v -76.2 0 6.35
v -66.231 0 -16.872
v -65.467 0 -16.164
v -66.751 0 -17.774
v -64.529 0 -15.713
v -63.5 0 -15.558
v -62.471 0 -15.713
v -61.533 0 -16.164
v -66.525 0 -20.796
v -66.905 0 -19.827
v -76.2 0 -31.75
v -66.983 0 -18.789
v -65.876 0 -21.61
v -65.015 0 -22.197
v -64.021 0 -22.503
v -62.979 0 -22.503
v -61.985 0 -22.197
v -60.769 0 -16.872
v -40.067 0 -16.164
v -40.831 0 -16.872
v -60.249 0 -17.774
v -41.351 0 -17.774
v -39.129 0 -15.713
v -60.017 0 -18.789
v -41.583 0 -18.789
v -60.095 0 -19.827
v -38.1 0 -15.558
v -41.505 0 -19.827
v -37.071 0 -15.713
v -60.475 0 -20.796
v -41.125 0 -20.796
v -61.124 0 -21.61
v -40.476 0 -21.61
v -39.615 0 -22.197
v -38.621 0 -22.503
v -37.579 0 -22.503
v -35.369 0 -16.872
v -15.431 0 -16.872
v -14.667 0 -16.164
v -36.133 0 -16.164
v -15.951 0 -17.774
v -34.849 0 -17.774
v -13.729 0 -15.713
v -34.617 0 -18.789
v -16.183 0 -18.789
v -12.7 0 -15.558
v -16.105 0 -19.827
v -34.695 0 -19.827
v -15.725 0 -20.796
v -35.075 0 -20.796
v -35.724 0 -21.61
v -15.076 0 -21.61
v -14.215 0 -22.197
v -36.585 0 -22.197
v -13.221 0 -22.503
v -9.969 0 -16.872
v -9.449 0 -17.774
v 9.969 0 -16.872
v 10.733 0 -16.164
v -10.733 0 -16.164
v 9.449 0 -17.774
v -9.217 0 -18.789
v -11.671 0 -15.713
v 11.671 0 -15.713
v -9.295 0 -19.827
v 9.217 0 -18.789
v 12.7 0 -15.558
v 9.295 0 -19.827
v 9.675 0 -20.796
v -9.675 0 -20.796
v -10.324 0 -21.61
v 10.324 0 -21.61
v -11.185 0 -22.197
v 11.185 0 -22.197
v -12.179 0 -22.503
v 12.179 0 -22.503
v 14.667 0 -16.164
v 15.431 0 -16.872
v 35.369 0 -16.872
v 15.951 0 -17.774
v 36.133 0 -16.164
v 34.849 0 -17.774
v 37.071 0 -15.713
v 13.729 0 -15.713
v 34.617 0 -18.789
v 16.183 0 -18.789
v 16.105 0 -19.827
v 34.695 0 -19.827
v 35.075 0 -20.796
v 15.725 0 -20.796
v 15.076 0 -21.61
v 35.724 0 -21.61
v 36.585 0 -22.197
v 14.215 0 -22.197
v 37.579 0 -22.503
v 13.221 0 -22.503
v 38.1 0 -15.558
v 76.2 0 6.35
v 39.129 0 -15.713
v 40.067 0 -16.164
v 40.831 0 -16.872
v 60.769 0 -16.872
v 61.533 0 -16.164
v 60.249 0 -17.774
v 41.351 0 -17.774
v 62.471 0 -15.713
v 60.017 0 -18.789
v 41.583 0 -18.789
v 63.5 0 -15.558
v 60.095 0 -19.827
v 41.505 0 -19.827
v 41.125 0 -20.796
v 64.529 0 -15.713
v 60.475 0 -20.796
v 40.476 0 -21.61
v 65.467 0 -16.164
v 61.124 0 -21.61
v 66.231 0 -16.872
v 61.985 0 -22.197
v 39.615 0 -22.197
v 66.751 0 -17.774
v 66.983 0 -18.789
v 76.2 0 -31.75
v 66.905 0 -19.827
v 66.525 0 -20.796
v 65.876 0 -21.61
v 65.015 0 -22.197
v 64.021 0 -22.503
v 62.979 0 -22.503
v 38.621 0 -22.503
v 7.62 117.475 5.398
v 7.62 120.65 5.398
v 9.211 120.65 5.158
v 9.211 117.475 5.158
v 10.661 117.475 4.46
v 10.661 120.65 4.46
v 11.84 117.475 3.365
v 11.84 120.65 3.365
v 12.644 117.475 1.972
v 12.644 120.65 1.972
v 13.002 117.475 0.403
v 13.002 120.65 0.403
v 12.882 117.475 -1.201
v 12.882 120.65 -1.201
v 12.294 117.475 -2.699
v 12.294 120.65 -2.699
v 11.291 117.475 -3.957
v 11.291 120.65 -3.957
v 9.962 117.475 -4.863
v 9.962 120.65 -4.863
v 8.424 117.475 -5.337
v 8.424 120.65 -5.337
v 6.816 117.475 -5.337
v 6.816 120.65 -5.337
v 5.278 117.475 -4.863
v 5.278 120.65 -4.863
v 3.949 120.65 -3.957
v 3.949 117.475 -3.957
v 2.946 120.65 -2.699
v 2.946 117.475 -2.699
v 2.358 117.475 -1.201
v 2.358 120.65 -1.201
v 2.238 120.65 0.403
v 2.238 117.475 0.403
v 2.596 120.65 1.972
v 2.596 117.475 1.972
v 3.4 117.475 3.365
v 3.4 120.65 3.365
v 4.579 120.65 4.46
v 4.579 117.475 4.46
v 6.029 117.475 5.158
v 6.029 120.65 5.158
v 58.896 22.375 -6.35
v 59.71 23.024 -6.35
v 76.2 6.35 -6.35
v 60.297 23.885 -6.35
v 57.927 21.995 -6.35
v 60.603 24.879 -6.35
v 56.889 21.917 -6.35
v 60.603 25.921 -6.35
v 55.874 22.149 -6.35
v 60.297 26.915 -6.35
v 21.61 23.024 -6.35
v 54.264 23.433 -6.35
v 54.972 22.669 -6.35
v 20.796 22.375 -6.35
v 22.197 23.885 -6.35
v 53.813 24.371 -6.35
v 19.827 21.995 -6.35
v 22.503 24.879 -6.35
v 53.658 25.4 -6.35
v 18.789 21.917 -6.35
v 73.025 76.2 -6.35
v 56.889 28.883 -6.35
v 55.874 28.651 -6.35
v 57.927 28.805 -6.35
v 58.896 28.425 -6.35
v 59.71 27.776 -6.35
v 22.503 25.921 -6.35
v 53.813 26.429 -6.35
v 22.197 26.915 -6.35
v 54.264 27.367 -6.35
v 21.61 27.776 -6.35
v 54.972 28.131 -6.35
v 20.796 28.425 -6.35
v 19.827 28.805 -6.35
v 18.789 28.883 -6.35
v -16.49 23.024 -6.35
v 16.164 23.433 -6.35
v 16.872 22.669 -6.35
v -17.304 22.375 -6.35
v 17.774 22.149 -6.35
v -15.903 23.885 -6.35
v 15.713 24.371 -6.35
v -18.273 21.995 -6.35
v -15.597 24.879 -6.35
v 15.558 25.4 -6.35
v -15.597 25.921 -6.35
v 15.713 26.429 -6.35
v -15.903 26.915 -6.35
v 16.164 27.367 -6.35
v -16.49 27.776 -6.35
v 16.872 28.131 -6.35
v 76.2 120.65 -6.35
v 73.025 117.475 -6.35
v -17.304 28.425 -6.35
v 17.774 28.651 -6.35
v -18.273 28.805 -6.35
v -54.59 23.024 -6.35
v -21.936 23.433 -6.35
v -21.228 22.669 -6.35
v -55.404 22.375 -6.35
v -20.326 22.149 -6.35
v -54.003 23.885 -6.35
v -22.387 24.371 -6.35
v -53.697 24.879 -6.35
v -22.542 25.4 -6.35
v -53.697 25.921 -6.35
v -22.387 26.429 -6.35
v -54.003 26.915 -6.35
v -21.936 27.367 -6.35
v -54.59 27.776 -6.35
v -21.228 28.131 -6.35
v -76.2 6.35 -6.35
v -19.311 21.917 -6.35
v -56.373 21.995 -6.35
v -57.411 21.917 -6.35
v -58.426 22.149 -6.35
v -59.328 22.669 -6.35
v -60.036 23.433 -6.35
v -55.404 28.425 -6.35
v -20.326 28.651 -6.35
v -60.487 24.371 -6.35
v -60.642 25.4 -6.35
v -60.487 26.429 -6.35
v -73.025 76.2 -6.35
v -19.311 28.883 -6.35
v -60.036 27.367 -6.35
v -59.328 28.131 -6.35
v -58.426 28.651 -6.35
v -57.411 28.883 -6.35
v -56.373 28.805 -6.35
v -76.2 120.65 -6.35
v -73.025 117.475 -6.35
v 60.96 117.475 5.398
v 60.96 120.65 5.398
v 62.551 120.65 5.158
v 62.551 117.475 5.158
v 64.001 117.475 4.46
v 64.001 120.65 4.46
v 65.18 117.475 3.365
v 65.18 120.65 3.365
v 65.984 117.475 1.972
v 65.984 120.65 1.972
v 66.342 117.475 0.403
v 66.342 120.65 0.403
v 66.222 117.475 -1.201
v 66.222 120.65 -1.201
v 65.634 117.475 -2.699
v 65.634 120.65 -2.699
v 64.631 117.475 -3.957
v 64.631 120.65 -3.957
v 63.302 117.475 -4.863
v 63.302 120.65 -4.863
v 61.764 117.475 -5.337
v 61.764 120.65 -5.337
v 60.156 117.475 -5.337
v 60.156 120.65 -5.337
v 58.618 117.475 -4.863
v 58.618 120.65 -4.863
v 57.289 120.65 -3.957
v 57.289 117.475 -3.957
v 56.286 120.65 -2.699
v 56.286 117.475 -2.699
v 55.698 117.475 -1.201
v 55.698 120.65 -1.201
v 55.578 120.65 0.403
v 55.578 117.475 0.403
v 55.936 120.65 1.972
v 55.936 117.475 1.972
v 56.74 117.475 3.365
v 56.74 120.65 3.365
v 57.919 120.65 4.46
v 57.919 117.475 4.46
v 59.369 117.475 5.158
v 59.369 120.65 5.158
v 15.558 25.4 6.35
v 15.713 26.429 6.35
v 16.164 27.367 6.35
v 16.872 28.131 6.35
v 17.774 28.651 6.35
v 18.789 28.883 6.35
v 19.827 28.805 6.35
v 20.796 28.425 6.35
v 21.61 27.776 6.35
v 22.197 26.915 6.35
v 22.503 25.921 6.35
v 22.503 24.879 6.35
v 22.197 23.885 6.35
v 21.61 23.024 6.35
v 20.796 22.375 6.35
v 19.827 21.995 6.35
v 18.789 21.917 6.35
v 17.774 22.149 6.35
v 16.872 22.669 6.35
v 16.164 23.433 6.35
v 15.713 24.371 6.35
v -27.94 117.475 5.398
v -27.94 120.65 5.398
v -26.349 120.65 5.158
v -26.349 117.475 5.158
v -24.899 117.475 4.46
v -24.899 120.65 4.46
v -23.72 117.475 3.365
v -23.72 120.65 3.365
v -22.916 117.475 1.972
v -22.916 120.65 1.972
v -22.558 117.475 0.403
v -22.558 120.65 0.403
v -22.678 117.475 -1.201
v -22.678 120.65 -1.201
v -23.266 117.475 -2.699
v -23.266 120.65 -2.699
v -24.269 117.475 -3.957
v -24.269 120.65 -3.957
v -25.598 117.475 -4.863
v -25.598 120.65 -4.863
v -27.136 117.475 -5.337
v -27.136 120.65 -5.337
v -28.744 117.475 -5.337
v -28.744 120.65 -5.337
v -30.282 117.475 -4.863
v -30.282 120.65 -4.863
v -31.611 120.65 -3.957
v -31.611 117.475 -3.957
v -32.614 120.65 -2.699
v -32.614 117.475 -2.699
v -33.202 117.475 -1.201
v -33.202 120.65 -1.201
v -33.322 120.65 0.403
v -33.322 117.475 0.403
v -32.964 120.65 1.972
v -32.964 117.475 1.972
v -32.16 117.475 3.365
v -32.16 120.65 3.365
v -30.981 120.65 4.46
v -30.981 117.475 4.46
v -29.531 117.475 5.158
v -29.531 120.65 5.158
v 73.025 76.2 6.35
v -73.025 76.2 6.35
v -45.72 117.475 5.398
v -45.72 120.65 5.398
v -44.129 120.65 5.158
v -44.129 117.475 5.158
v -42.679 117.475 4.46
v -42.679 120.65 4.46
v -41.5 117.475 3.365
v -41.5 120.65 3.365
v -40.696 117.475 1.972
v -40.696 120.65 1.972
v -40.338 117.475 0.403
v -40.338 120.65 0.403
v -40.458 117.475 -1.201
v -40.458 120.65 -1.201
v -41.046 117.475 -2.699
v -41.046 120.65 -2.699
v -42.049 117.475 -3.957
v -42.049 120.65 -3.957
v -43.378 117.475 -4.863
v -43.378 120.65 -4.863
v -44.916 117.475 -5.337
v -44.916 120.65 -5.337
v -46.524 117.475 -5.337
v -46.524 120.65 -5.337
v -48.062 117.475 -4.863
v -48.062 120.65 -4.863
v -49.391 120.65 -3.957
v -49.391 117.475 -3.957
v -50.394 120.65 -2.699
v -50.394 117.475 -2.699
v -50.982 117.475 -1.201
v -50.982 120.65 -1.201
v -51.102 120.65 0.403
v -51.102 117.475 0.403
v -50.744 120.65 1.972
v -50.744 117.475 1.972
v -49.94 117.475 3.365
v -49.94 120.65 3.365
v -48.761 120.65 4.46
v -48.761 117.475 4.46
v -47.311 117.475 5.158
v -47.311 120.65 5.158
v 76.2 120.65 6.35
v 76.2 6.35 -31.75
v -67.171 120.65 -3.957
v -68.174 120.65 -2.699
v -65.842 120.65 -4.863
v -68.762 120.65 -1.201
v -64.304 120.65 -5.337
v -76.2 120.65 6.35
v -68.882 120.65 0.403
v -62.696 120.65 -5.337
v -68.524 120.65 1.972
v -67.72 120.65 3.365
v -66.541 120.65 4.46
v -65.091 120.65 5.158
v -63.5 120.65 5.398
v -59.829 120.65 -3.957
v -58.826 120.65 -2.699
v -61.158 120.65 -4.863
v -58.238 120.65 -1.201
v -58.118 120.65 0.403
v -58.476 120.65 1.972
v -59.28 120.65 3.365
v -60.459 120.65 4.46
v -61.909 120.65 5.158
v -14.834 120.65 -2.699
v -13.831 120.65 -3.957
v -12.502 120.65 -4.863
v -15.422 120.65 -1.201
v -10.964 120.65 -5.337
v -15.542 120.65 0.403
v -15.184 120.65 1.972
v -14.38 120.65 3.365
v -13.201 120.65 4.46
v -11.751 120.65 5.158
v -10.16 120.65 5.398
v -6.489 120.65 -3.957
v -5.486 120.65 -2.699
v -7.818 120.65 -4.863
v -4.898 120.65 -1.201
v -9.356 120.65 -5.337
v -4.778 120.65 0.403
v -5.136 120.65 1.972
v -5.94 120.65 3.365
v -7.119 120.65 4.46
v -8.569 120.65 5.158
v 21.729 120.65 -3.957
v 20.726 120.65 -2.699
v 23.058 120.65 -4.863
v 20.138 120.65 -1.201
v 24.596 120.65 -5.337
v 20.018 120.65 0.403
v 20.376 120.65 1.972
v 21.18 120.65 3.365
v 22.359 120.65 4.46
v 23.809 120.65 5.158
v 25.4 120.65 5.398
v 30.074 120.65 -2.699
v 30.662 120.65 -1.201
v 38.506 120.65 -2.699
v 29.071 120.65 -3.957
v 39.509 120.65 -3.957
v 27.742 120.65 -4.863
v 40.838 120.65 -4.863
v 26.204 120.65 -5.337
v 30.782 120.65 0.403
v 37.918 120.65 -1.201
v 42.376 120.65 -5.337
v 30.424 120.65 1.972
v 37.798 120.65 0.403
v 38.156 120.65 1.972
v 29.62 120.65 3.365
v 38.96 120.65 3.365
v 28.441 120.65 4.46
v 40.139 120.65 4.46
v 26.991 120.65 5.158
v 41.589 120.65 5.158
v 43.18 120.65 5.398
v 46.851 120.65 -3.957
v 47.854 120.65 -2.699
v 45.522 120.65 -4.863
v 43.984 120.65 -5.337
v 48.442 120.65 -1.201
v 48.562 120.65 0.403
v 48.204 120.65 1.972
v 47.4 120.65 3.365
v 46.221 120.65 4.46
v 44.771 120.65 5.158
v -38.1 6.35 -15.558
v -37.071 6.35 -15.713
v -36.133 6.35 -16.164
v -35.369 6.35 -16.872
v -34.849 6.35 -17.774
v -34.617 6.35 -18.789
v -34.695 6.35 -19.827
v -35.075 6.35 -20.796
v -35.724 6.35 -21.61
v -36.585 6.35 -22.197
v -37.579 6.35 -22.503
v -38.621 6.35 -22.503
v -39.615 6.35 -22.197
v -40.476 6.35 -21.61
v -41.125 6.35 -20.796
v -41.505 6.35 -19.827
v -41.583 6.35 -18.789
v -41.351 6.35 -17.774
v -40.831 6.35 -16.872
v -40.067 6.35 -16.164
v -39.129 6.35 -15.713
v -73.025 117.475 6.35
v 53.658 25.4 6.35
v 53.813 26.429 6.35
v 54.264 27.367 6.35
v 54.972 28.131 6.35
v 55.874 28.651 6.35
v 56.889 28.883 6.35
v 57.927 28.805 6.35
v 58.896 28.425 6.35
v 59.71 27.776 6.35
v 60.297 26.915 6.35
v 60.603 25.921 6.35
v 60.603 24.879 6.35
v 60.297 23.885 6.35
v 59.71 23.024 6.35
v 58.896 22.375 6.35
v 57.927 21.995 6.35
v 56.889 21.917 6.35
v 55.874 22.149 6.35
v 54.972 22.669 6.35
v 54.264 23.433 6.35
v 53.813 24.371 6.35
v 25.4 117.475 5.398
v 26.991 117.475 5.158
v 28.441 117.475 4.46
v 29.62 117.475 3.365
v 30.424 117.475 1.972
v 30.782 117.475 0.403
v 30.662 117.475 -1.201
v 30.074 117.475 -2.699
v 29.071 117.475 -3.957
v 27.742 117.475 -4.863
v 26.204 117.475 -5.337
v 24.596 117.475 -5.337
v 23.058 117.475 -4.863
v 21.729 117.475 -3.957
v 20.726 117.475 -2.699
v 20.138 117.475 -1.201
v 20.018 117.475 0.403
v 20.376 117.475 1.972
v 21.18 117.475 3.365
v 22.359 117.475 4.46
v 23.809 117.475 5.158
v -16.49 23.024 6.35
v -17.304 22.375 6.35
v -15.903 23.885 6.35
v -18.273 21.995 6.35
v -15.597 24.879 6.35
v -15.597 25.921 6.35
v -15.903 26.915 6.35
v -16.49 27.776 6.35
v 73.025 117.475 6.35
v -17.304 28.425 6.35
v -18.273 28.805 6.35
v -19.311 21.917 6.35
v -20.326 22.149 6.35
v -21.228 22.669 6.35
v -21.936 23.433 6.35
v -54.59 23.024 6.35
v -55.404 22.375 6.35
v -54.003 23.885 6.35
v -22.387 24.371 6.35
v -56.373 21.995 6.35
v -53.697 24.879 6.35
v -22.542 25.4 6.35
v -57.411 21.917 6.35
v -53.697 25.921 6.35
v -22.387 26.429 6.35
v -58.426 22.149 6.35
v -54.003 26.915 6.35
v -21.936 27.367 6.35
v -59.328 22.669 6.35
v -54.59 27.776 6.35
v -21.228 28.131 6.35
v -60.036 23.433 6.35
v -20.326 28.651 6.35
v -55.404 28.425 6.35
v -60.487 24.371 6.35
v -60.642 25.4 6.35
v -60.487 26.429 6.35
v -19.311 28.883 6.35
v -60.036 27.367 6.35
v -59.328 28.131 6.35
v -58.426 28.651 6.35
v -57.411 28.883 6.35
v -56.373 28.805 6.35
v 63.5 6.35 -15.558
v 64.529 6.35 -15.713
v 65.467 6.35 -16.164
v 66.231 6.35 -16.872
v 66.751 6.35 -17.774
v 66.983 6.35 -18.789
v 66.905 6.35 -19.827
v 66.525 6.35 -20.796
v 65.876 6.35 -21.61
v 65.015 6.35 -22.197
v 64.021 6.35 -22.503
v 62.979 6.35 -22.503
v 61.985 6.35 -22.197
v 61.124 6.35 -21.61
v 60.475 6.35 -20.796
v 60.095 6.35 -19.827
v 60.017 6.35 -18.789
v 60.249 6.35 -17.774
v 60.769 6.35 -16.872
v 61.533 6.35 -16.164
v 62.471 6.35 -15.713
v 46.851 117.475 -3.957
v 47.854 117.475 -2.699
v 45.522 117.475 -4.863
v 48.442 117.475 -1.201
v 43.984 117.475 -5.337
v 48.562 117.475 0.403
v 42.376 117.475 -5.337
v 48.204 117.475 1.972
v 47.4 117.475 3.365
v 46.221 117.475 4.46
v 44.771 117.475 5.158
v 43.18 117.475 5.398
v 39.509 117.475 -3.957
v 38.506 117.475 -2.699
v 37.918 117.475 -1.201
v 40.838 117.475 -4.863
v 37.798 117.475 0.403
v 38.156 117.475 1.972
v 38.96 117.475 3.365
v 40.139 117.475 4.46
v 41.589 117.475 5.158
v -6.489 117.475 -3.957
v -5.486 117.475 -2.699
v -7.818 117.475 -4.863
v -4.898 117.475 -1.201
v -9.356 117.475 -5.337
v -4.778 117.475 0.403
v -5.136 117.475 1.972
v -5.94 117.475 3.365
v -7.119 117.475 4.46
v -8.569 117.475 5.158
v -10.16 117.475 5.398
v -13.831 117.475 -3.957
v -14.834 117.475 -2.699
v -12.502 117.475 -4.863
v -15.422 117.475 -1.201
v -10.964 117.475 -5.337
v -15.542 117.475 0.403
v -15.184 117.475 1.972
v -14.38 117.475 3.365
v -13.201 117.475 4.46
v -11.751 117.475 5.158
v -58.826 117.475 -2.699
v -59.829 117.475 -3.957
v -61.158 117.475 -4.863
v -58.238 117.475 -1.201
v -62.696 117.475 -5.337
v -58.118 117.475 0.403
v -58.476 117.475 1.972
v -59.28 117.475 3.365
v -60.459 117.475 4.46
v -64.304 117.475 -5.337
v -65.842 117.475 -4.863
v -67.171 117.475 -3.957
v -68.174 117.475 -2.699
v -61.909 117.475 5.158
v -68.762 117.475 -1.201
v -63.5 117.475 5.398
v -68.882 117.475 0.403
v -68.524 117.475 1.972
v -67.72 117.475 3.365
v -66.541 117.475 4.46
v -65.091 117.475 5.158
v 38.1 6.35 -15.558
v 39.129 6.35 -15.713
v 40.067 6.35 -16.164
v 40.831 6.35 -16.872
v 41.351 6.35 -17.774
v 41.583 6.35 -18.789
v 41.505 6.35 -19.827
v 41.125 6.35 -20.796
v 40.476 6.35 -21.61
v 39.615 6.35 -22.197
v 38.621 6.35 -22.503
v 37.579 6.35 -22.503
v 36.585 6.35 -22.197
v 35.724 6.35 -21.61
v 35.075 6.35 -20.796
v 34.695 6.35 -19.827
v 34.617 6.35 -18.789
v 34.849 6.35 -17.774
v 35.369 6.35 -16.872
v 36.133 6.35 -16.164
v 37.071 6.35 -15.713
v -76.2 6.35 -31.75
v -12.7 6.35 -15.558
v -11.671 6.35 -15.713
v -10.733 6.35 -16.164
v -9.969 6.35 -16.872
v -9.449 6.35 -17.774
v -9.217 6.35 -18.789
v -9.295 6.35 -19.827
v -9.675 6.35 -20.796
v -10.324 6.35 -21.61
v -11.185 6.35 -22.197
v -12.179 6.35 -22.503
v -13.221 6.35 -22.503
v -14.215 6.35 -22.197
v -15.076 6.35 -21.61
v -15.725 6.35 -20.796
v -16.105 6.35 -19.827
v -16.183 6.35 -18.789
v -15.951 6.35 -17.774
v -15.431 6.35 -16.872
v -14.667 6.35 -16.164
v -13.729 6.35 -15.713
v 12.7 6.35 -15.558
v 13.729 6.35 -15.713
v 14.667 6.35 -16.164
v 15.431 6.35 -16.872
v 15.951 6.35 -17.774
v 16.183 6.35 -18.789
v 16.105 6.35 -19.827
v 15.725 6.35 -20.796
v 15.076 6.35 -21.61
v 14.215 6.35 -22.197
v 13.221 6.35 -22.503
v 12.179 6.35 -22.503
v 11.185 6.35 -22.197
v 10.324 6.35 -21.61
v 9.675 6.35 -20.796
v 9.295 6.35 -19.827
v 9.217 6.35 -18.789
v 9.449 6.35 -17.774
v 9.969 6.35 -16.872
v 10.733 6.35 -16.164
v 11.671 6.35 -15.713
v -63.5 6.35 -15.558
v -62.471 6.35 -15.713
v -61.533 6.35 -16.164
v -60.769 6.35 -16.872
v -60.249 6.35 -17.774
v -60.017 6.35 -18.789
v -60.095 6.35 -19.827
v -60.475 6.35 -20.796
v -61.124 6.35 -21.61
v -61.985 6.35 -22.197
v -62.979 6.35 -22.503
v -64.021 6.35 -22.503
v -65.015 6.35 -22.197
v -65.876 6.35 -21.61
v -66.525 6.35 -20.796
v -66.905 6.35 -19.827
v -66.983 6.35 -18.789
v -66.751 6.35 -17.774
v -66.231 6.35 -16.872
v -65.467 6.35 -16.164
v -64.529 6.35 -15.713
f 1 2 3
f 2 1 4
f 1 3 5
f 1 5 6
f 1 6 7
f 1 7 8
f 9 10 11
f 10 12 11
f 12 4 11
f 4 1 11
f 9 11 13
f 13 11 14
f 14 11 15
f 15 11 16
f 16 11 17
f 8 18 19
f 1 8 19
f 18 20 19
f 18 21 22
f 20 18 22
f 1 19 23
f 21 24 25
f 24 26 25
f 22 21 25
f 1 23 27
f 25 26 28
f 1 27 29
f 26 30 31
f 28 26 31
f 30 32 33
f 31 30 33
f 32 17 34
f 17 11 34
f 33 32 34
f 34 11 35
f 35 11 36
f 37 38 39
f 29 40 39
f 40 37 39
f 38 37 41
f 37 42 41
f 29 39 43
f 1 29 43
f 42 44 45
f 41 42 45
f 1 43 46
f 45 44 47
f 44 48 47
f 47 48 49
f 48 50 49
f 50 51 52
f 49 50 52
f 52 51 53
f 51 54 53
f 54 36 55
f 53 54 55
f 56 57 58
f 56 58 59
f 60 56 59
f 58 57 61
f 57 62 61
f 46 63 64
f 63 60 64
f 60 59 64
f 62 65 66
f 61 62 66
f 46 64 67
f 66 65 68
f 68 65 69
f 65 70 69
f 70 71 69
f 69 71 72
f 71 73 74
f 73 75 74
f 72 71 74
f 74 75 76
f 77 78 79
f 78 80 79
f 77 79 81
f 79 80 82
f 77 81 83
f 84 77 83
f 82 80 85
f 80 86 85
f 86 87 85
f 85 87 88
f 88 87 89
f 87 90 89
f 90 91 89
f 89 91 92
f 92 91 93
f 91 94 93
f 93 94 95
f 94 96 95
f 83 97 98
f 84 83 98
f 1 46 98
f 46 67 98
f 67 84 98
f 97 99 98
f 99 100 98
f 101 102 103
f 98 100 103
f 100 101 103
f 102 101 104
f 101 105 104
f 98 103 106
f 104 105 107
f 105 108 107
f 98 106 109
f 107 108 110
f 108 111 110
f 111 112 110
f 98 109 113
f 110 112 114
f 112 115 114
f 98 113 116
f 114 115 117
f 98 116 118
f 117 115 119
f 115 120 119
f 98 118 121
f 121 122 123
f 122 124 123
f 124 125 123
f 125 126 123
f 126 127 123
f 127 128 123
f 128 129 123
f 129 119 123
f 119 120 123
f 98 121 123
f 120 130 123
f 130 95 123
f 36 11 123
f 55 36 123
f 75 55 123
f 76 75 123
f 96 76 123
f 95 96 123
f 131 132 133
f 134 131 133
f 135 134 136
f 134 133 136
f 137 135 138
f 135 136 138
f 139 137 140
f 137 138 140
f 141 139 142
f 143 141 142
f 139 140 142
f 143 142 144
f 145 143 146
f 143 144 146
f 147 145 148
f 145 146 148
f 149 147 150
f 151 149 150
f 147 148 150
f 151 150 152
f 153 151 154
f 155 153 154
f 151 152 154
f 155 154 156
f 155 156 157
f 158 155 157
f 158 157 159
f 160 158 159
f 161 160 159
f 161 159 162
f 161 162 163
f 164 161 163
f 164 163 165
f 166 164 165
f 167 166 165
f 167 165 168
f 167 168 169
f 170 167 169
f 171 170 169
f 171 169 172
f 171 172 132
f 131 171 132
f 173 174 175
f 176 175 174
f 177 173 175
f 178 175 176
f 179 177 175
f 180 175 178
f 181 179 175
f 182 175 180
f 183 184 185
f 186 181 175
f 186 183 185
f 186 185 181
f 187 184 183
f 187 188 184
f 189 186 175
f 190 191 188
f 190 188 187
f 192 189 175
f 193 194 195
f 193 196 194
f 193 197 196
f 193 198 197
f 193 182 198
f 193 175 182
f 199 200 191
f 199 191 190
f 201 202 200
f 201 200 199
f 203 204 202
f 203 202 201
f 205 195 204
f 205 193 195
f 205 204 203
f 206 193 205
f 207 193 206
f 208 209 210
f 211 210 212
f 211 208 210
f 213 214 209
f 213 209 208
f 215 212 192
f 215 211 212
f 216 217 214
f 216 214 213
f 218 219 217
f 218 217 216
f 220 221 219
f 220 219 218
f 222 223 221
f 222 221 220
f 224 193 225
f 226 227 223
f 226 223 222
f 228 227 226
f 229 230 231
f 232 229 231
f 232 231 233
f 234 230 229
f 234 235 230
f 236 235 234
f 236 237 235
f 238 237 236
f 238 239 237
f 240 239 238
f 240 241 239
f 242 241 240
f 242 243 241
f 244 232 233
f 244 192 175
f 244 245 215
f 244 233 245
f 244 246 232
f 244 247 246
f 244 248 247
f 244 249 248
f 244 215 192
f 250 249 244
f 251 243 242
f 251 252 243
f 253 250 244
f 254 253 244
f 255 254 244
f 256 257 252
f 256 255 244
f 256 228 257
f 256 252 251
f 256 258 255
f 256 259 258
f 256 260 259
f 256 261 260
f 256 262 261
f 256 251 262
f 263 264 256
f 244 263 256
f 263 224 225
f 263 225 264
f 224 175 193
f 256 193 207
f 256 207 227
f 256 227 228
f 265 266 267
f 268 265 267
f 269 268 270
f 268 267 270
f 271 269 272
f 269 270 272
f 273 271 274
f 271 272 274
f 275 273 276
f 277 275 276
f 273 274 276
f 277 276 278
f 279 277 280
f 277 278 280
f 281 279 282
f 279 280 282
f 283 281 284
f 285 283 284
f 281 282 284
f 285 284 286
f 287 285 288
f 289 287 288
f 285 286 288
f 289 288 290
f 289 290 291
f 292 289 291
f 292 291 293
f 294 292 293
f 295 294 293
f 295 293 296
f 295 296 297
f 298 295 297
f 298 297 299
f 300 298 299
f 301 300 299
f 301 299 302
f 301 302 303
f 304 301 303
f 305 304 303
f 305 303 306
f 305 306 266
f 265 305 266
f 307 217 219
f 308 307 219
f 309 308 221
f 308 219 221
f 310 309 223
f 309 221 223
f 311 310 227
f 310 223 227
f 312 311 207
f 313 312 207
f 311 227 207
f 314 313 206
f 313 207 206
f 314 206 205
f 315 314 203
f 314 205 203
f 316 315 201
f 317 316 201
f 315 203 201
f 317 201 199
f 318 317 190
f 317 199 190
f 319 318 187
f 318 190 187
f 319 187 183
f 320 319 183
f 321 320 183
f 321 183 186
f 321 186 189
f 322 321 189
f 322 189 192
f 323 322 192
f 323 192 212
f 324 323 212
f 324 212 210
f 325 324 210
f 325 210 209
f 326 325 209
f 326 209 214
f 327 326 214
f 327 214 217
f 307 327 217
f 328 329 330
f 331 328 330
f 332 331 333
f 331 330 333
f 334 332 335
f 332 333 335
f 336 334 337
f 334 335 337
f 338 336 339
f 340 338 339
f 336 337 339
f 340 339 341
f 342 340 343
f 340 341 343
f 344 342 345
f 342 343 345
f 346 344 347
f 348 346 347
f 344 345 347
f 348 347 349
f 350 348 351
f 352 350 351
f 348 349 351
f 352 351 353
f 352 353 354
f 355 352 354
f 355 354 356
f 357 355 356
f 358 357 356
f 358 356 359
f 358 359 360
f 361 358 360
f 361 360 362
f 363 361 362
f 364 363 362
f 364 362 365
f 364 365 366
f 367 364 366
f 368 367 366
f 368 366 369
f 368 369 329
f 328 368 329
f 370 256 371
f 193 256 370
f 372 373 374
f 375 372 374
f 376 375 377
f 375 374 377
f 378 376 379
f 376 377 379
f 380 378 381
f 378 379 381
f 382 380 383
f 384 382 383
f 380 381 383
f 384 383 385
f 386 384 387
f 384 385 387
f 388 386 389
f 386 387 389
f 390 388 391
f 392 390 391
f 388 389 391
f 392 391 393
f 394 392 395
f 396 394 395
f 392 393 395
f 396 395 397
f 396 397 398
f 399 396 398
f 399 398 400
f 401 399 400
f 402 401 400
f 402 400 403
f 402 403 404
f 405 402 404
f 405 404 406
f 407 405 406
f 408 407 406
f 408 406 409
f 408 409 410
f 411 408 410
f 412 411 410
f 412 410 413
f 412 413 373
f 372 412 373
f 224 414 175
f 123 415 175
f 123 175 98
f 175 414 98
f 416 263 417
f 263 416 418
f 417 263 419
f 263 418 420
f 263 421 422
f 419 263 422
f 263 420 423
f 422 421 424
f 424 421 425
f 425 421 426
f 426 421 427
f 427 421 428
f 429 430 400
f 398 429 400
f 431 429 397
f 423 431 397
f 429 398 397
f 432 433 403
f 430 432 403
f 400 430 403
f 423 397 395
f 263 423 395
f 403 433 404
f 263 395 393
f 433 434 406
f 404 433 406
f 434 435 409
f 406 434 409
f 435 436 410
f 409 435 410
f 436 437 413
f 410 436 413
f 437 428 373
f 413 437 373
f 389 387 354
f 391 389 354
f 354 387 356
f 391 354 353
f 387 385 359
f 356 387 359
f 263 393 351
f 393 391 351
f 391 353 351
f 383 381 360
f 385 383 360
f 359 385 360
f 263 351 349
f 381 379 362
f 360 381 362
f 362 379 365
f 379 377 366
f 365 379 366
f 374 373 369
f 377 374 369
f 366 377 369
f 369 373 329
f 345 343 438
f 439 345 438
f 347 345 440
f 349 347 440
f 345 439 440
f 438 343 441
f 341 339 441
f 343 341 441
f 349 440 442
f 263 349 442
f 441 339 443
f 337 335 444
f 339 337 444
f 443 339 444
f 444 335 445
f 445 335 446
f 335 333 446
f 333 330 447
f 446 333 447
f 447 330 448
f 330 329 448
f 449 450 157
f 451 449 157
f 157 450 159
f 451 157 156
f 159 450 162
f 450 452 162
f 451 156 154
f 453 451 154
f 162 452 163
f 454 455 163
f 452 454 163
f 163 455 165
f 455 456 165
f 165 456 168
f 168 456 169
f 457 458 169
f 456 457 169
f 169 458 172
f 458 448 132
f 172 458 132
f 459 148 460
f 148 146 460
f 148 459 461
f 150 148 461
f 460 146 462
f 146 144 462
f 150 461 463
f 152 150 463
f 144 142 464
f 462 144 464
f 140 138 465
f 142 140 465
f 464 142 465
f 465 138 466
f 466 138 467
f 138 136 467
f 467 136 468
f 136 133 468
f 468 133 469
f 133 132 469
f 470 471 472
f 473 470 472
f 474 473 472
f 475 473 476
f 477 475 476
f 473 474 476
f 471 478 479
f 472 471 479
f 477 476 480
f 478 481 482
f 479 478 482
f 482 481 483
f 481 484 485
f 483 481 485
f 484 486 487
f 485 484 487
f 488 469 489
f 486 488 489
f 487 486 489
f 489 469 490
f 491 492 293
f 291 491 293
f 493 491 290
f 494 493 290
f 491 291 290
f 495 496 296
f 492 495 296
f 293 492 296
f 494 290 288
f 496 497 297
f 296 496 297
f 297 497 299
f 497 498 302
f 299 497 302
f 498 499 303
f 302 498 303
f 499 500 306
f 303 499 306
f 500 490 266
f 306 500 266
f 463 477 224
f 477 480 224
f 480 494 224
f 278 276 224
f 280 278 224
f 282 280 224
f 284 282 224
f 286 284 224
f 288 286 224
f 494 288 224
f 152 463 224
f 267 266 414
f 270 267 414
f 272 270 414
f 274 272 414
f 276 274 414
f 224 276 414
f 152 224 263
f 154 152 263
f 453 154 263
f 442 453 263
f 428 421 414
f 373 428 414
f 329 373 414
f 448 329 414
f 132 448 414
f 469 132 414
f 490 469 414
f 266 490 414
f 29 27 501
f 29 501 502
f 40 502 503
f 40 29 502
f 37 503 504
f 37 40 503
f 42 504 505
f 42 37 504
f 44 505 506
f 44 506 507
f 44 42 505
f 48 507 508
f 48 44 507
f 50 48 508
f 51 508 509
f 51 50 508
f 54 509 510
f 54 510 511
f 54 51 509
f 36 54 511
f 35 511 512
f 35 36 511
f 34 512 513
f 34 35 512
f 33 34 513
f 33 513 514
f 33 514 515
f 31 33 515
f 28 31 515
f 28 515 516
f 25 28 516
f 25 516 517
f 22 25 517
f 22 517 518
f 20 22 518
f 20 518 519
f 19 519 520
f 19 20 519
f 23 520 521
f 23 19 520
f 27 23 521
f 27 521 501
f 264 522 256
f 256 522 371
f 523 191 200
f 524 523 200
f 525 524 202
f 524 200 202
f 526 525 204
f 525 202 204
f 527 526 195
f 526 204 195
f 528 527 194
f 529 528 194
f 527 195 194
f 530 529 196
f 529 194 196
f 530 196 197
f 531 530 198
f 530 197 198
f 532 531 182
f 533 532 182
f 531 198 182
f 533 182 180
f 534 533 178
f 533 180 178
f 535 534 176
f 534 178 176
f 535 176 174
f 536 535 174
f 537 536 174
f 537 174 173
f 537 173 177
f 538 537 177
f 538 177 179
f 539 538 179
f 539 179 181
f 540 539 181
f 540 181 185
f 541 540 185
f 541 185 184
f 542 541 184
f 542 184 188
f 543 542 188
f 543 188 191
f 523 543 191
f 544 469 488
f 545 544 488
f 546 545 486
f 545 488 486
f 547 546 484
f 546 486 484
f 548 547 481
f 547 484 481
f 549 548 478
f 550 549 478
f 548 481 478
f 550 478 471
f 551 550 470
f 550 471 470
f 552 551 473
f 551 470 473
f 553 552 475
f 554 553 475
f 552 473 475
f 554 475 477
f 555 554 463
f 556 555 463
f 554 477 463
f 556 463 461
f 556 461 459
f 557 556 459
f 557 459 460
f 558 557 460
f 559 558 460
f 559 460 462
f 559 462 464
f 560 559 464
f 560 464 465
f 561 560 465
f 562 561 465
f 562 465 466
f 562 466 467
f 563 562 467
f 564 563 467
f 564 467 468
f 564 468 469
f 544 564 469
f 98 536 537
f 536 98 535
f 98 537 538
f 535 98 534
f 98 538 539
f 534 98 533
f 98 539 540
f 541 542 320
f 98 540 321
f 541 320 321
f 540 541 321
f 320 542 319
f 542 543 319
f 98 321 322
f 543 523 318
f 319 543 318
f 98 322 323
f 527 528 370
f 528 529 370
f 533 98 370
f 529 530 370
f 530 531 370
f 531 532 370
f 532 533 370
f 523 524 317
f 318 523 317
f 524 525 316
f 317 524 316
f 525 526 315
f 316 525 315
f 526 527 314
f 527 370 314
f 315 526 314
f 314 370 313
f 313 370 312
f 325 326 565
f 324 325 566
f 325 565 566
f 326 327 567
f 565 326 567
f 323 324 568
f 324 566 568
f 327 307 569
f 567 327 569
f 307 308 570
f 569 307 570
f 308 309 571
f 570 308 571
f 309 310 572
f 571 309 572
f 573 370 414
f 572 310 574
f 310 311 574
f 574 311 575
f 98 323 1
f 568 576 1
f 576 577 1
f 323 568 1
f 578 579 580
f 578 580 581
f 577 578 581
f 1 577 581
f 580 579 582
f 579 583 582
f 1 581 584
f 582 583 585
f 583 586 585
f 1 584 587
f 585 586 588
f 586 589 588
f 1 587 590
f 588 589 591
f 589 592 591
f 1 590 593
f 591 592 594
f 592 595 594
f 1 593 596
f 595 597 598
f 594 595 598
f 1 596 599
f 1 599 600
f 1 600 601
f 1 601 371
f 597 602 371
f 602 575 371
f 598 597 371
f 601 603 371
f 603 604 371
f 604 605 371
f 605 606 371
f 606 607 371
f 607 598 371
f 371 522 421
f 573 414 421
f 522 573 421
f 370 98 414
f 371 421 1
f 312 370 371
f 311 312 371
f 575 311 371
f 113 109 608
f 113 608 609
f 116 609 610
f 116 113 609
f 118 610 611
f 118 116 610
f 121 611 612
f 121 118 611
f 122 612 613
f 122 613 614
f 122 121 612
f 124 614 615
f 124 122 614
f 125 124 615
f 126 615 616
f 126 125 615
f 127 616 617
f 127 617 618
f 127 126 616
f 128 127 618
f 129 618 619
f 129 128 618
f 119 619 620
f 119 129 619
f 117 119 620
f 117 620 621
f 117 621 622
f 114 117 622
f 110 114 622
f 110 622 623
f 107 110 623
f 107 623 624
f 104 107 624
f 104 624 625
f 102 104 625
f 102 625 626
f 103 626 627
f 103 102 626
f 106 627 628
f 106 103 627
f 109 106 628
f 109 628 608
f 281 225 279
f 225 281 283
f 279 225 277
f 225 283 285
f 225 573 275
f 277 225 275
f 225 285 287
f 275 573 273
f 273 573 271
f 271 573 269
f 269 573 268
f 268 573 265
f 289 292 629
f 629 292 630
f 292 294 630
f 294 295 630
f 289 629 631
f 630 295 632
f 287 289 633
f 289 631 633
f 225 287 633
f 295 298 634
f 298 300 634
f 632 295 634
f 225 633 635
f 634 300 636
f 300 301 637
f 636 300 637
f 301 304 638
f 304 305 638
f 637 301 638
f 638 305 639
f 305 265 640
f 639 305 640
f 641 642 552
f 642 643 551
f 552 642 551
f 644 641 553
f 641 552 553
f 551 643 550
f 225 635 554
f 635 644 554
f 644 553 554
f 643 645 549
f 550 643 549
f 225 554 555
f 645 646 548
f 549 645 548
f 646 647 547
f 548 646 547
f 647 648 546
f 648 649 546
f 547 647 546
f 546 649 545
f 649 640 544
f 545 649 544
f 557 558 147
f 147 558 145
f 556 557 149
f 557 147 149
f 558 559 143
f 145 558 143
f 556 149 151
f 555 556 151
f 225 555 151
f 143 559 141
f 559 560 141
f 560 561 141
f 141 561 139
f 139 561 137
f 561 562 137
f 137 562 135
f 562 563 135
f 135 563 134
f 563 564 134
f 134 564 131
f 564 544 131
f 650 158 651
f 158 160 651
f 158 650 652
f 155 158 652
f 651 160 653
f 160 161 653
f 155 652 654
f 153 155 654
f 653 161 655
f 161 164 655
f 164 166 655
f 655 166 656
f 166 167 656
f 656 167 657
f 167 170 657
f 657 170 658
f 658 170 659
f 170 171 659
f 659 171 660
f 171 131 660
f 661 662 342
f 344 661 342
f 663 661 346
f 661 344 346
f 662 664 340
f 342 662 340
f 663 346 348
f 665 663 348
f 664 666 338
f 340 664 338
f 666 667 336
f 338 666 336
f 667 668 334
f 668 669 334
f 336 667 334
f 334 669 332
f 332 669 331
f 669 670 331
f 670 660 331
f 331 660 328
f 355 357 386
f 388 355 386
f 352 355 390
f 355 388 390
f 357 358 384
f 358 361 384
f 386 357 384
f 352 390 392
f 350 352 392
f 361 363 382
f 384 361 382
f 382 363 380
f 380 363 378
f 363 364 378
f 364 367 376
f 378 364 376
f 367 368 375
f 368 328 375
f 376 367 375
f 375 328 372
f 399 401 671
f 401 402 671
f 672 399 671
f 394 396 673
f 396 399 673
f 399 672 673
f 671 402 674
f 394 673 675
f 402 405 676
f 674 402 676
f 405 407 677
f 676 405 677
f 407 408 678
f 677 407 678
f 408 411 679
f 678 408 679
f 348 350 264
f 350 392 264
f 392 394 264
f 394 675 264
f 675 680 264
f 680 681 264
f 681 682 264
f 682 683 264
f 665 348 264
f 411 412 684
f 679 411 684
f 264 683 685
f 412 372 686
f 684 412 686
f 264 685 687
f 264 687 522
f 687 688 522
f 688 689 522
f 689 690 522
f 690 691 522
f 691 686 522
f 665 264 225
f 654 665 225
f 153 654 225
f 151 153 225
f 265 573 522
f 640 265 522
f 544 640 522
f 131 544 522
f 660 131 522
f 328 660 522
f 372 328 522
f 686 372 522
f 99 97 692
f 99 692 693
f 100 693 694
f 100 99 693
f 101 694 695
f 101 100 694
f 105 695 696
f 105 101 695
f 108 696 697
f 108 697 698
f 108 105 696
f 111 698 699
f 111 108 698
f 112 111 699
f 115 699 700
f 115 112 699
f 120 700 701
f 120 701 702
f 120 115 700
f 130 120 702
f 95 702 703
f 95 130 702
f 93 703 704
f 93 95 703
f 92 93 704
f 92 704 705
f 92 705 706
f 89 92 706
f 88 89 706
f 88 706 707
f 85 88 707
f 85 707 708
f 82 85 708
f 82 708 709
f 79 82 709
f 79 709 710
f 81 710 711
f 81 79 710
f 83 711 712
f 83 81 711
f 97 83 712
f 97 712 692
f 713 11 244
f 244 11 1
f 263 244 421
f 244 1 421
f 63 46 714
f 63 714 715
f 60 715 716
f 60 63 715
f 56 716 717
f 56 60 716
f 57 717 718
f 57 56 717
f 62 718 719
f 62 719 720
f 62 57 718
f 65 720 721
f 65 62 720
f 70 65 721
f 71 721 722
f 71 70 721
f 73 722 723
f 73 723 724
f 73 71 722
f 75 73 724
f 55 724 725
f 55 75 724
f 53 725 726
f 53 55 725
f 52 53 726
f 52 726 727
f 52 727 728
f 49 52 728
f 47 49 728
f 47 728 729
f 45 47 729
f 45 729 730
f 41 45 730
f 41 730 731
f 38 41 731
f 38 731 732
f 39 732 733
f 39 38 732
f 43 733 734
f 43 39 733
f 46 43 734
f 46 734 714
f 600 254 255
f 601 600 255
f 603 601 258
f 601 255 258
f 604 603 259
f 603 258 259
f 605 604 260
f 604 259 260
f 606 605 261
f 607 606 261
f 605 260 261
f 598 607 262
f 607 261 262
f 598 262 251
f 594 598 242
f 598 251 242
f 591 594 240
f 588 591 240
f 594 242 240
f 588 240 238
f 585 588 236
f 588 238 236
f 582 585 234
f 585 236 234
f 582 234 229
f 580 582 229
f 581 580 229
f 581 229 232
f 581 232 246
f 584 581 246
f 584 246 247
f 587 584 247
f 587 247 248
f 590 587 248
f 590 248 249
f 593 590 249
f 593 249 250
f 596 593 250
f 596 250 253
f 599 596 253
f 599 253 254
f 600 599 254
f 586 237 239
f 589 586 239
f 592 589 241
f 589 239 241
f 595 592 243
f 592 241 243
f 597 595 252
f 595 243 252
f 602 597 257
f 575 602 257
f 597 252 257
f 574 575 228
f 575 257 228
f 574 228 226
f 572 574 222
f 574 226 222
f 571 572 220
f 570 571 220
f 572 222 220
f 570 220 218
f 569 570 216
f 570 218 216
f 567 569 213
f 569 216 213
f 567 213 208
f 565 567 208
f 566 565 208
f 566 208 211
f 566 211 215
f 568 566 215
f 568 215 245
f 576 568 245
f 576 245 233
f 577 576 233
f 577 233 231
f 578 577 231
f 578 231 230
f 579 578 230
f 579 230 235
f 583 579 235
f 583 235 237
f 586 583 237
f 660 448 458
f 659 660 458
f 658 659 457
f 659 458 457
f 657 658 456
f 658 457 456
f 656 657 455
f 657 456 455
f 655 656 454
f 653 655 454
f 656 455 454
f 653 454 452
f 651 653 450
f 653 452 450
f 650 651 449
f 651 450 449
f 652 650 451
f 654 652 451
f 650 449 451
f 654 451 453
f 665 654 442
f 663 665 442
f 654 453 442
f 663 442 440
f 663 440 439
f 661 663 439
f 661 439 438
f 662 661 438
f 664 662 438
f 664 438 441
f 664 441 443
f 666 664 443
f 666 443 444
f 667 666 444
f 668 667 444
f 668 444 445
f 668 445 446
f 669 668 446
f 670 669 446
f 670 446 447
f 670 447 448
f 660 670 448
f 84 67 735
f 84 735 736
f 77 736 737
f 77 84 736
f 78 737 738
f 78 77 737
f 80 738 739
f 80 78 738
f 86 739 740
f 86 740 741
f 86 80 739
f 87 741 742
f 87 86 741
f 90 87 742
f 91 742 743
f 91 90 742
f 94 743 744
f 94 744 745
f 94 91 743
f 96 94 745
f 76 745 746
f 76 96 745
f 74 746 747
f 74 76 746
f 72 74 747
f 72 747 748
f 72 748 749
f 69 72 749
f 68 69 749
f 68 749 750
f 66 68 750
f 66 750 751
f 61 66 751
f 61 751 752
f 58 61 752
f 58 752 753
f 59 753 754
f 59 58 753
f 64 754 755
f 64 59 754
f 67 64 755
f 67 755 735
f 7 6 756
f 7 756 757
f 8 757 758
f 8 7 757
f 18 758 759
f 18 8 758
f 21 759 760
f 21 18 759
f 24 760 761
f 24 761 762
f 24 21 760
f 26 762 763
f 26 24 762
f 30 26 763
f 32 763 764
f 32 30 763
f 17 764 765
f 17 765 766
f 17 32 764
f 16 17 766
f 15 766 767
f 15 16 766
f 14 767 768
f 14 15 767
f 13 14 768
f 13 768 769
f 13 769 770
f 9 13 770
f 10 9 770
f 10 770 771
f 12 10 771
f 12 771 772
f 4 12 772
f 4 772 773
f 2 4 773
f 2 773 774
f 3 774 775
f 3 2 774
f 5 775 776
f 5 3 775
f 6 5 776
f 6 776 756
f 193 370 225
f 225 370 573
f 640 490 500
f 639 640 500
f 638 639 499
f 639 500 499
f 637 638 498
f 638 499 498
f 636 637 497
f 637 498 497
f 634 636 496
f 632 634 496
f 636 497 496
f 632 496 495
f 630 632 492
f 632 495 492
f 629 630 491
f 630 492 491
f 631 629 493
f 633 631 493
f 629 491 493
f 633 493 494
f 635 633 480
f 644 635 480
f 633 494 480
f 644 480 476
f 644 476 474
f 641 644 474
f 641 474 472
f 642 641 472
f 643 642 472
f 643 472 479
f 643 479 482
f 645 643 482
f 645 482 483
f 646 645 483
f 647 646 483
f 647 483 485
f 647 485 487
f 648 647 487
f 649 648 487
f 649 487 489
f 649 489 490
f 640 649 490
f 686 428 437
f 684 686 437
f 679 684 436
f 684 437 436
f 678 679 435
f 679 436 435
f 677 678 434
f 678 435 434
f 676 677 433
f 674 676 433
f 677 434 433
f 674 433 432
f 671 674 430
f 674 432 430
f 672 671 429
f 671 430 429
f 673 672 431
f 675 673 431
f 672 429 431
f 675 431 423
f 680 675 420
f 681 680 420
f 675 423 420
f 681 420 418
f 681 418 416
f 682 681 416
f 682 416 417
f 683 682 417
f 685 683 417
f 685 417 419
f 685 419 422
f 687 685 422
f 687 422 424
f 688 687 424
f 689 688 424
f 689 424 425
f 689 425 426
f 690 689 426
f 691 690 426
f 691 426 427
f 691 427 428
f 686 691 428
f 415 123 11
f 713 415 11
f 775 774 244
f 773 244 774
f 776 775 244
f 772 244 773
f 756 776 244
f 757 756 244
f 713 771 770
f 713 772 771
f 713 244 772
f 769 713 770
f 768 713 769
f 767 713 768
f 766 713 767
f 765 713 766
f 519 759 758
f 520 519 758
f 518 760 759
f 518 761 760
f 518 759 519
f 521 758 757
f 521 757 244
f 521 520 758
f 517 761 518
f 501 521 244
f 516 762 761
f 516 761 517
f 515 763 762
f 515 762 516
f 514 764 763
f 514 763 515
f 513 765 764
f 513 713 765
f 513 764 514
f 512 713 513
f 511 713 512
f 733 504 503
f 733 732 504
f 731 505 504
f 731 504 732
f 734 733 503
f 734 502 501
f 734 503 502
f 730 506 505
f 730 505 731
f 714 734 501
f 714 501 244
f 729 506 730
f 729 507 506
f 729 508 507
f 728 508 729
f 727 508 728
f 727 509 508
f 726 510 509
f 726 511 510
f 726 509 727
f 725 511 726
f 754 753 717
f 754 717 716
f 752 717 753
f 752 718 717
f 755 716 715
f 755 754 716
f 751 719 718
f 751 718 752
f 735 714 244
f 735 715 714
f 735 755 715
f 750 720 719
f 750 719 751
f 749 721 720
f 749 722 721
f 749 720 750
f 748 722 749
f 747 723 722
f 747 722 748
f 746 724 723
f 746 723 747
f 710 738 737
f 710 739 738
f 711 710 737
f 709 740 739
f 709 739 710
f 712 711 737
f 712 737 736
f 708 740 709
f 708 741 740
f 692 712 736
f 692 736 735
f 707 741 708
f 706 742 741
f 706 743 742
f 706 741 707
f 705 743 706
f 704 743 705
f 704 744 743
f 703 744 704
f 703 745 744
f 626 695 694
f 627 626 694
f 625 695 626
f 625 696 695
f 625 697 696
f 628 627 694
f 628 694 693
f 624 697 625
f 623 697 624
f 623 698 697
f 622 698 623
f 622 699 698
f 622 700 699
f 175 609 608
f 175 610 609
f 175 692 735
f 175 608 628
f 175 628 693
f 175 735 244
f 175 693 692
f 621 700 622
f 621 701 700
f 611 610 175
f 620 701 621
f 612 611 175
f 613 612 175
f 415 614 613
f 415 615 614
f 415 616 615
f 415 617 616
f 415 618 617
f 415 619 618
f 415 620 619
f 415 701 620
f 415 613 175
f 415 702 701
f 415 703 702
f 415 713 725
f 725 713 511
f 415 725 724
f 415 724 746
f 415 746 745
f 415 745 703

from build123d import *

# Parameters (mm, degrees)
SKETCH1_W           = 152.4
SKETCH1_H           = 12.7
BOSS_EXTRUDE1_DEPTH = 76.2
SKETCH2_R           = 3.4925
BOSS_EXTRUDE4_DEPTH = 6.35
BOSS_EXTRUDE5_DEPTH = 12.7
CUT_EXTRUDE1_REACH  = 148.188
SKETCH4_R           = 5.3975
SKETCH5_R           = 3.4925
CUT_EXTRUDE2_DEPTH  = 145.941445074


with BuildPart() as part:
    # Sketch1 → Boss-Extrude1 (new body)
    with BuildSketch(Plane(origin=(0, 0, 0), x_dir=(1, 0, 0), z_dir=(0, 1, 0))):
        Rectangle(SKETCH1_W, SKETCH1_H)
    extrude(amount=BOSS_EXTRUDE1_DEPTH)

    # Sketch2 → Boss-Extrude4 (add)
    with BuildSketch(Plane(origin=(0, 0, 0), x_dir=(1, 0, 0), z_dir=(0, 1, 0))):
        Polygon((-76.2, 19.05), (-76.2, 6.35), (76.2, 6.35), (76.2, 31.75), (-76.2, 31.75), align=None)
        with Locations(Location((-63.5, 19.05, 0), (0, 0, 270))):
            Circle(SKETCH2_R, mode=Mode.SUBTRACT)
        with Locations(Location((-38.1, 19.05, 0), (0, 0, 270))):
            Circle(SKETCH2_R, mode=Mode.SUBTRACT)
        with Locations(Location((-12.7, 19.05, 0), (0, 0, 270))):
            Circle(SKETCH2_R, mode=Mode.SUBTRACT)
        with Locations(Location((12.7, 19.05, 0), (0, 0, 270))):
            Circle(SKETCH2_R, mode=Mode.SUBTRACT)
        with Locations(Location((38.1, 19.05, 0), (0, 0, 270))):
            Circle(SKETCH2_R, mode=Mode.SUBTRACT)
        with Locations(Location((63.5, 19.05, 0), (0, 0, 270))):
            Circle(SKETCH2_R, mode=Mode.SUBTRACT)
    extrude(amount=BOSS_EXTRUDE4_DEPTH)

    # Sketch3 → Boss-Extrude5 (add)
    with BuildSketch(Plane.XY.offset(6.35)):
        Polygon((-76.2, 76.2), (-76.2, 120.65), (76.2, 120.65), (76.2, 76.2), (73.025, 76.2), (73.025, 117.475), (-73.025, 117.475), (-73.025, 76.2), align=None)
    extrude(amount=-BOSS_EXTRUDE5_DEPTH)

    # Sketch4 → Cut-Extrude1 (cut, up to next)
    with BuildSketch(Plane(origin=(0, 120.65, 0), x_dir=(1, 0, 0), z_dir=(0, 1, 0)), mode=Mode.PRIVATE) as cut_extrude1_sk1:
        with Locations(Location((-63.5, 0, 0), (0, 0, 270))):
            Circle(SKETCH4_R)
    cut_extrude1_tool1 = extrude(cut_extrude1_sk1.sketch, amount=-CUT_EXTRUDE1_REACH, mode=Mode.PRIVATE) & part.part
    # Sketch4 → Cut-Extrude1 (cut, up to next)
    with BuildSketch(Plane(origin=(0, 120.65, 0), x_dir=(1, 0, 0), z_dir=(0, 1, 0)), mode=Mode.PRIVATE) as cut_extrude1_sk2:
        with Locations(Location((-45.72, 0, 0), (0, 0, 270))):
            Circle(SKETCH4_R)
    cut_extrude1_tool2 = extrude(cut_extrude1_sk2.sketch, amount=-CUT_EXTRUDE1_REACH, mode=Mode.PRIVATE) & part.part
    # Sketch4 → Cut-Extrude1 (cut, up to next)
    with BuildSketch(Plane(origin=(0, 120.65, 0), x_dir=(1, 0, 0), z_dir=(0, 1, 0)), mode=Mode.PRIVATE) as cut_extrude1_sk3:
        with Locations(Location((-27.94, 0, 0), (0, 0, 270))):
            Circle(SKETCH4_R)
    cut_extrude1_tool3 = extrude(cut_extrude1_sk3.sketch, amount=-CUT_EXTRUDE1_REACH, mode=Mode.PRIVATE) & part.part
    # Sketch4 → Cut-Extrude1 (cut, up to next)
    with BuildSketch(Plane(origin=(0, 120.65, 0), x_dir=(1, 0, 0), z_dir=(0, 1, 0)), mode=Mode.PRIVATE) as cut_extrude1_sk4:
        with Locations(Location((-10.16, 0, 0), (0, 0, 270))):
            Circle(SKETCH4_R)
    cut_extrude1_tool4 = extrude(cut_extrude1_sk4.sketch, amount=-CUT_EXTRUDE1_REACH, mode=Mode.PRIVATE) & part.part
    # Sketch4 → Cut-Extrude1 (cut, up to next)
    with BuildSketch(Plane(origin=(0, 120.65, 0), x_dir=(1, 0, 0), z_dir=(0, 1, 0)), mode=Mode.PRIVATE) as cut_extrude1_sk5:
        with Locations(Location((7.62, 0, 0), (0, 0, 270))):
            Circle(SKETCH4_R)
    cut_extrude1_tool5 = extrude(cut_extrude1_sk5.sketch, amount=-CUT_EXTRUDE1_REACH, mode=Mode.PRIVATE) & part.part
    # Sketch4 → Cut-Extrude1 (cut, up to next)
    with BuildSketch(Plane(origin=(0, 120.65, 0), x_dir=(1, 0, 0), z_dir=(0, 1, 0)), mode=Mode.PRIVATE) as cut_extrude1_sk6:
        with Locations(Location((25.4, 0, 0), (0, 0, 270))):
            Circle(SKETCH4_R)
    cut_extrude1_tool6 = extrude(cut_extrude1_sk6.sketch, amount=-CUT_EXTRUDE1_REACH, mode=Mode.PRIVATE) & part.part
    # Sketch4 → Cut-Extrude1 (cut, up to next)
    with BuildSketch(Plane(origin=(0, 120.65, 0), x_dir=(1, 0, 0), z_dir=(0, 1, 0)), mode=Mode.PRIVATE) as cut_extrude1_sk7:
        with Locations(Location((43.18, 0, 0), (0, 0, 270))):
            Circle(SKETCH4_R)
    cut_extrude1_tool7 = extrude(cut_extrude1_sk7.sketch, amount=-CUT_EXTRUDE1_REACH, mode=Mode.PRIVATE) & part.part
    # Sketch4 → Cut-Extrude1 (cut, up to next)
    with BuildSketch(Plane(origin=(0, 120.65, 0), x_dir=(1, 0, 0), z_dir=(0, 1, 0)), mode=Mode.PRIVATE) as cut_extrude1_sk8:
        with Locations(Location((60.96, 0, 0), (0, 0, 270))):
            Circle(SKETCH4_R)
    cut_extrude1_tool8 = extrude(cut_extrude1_sk8.sketch, amount=-CUT_EXTRUDE1_REACH, mode=Mode.PRIVATE) & part.part
    add(cut_extrude1_tool1.solids().sort_by_distance((-63.5, 120.65, 0))[0], mode=Mode.SUBTRACT)
    add(cut_extrude1_tool2.solids().sort_by_distance((-45.72, 120.65, 0))[0], mode=Mode.SUBTRACT)
    add(cut_extrude1_tool3.solids().sort_by_distance((-27.94, 120.65, 0))[0], mode=Mode.SUBTRACT)
    add(cut_extrude1_tool4.solids().sort_by_distance((-10.16, 120.65, 0))[0], mode=Mode.SUBTRACT)
    add(cut_extrude1_tool5.solids().sort_by_distance((7.62, 120.65, 0))[0], mode=Mode.SUBTRACT)
    add(cut_extrude1_tool6.solids().sort_by_distance((25.4, 120.65, 0))[0], mode=Mode.SUBTRACT)
    add(cut_extrude1_tool7.solids().sort_by_distance((43.18, 120.65, 0))[0], mode=Mode.SUBTRACT)
    add(cut_extrude1_tool8.solids().sort_by_distance((60.96, 120.65, 0))[0], mode=Mode.SUBTRACT)

    # Sketch5 → Cut-Extrude2 (cut, through all)
    with BuildSketch(Plane(origin=(0, 0, -6.35), x_dir=(-1, 0, 0), z_dir=(0, 0, -1))):
        with Locations((-57.15, 25.4)):
            Circle(SKETCH5_R)
        with Locations((-19.05, 25.4)):
            Circle(SKETCH5_R)
        with Locations((19.05, 25.4)):
            Circle(SKETCH5_R)
        with Locations((57.15, 25.4)):
            Circle(SKETCH5_R)
    extrude(amount=-CUT_EXTRUDE2_DEPTH, mode=Mode.SUBTRACT)


solid = part.part
